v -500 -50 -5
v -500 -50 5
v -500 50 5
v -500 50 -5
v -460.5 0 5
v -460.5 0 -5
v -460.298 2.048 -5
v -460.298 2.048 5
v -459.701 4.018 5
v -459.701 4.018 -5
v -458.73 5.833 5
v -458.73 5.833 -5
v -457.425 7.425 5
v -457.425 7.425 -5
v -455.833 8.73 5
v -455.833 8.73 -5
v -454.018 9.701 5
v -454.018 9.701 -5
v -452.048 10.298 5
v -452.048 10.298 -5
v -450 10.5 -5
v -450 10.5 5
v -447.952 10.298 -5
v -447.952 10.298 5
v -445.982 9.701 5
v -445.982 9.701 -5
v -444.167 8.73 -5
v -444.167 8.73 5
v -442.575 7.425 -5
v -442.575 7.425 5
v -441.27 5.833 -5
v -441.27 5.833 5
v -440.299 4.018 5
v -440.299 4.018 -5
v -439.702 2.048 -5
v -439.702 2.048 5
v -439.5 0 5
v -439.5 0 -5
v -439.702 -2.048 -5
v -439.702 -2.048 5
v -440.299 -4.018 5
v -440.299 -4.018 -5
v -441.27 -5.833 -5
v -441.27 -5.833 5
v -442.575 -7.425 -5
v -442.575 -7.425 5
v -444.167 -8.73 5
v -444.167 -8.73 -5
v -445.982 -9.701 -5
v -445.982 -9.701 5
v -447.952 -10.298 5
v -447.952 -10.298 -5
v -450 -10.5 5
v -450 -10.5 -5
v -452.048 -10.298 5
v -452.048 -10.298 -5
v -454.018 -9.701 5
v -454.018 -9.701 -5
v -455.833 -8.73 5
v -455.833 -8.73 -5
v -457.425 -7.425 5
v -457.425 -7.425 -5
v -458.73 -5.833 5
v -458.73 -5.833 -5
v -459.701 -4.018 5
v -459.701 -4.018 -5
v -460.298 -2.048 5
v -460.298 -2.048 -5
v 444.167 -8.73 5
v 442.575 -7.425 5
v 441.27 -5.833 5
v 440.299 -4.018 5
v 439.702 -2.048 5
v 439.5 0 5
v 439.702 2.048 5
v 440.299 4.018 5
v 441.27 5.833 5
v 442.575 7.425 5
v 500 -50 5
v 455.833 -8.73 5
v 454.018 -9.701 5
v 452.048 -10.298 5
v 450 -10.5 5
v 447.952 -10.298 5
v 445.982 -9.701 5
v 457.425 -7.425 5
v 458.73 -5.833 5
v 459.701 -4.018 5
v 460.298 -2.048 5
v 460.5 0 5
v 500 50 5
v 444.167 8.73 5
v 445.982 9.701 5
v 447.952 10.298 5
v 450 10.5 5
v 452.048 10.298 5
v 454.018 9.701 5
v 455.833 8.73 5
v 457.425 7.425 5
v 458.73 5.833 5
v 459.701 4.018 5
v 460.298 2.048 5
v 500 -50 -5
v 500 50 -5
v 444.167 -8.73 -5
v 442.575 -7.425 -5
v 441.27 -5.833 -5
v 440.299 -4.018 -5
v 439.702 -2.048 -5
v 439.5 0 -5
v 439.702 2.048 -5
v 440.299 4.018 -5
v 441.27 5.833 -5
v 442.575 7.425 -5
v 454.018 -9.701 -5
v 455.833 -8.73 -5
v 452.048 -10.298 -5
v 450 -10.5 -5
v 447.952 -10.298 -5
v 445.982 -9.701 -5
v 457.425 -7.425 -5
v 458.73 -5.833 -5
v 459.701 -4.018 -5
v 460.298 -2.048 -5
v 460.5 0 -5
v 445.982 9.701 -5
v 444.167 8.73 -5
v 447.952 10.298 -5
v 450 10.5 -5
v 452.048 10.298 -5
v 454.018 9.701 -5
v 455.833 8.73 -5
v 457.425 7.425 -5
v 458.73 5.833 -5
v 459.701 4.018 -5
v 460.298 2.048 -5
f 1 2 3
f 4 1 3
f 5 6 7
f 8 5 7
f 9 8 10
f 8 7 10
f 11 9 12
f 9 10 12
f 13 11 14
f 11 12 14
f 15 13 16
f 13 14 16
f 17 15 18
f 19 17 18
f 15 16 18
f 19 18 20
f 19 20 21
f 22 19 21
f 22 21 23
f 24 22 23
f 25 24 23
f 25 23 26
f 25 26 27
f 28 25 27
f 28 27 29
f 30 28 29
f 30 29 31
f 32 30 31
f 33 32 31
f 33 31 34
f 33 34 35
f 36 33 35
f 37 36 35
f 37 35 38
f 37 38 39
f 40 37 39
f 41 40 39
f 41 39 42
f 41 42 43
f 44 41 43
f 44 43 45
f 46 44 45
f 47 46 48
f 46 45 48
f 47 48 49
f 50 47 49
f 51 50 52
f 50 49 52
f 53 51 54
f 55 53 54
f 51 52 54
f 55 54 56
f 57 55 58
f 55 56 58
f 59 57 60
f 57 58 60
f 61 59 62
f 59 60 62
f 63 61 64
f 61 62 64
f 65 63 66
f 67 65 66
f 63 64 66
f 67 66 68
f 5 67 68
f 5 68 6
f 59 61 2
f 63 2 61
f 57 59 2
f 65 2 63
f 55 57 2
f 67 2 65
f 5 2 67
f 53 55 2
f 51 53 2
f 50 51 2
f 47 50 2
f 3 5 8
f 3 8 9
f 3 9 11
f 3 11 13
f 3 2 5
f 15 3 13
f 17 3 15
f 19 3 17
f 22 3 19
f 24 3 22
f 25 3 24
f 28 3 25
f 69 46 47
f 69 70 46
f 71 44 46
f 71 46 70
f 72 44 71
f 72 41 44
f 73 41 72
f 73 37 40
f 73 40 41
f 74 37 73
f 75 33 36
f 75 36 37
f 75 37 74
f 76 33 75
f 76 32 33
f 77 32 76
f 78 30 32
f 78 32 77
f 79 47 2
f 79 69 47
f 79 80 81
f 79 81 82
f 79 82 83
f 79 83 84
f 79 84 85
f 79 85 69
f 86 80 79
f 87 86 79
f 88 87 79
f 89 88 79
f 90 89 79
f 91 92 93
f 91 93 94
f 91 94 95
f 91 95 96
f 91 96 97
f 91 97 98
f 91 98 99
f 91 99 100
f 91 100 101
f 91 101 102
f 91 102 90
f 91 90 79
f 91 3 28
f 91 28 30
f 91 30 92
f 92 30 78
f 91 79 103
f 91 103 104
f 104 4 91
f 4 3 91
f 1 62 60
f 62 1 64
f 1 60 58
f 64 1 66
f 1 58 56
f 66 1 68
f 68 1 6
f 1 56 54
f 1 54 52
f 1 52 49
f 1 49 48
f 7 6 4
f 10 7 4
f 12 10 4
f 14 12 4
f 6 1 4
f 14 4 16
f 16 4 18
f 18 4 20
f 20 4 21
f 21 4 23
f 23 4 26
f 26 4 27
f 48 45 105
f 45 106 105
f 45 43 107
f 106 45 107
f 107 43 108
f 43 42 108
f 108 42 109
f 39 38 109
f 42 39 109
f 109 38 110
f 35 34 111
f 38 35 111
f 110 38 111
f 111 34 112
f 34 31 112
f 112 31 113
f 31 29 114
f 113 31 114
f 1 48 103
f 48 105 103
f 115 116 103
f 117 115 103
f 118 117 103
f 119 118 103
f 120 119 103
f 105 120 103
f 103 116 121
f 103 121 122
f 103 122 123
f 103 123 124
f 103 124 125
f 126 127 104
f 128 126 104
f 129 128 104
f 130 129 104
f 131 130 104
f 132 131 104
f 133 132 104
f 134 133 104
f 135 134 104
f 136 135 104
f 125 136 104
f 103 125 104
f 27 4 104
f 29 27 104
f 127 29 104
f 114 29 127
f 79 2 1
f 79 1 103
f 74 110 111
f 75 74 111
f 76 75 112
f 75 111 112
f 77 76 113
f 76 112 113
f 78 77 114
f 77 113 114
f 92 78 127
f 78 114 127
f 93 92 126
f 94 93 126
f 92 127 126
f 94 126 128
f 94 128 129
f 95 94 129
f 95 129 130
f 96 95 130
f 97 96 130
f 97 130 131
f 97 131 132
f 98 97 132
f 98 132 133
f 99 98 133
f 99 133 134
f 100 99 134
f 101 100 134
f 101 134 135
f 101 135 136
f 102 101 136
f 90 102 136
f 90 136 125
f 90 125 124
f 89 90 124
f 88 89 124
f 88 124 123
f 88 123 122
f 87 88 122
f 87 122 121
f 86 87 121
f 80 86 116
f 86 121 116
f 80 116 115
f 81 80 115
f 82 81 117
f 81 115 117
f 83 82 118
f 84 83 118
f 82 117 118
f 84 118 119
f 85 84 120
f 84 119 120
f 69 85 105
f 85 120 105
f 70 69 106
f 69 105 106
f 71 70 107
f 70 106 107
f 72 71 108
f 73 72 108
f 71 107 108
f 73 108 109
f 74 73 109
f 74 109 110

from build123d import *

# Parameters (mm, degrees)
SKETCH_1_W          = 1000
SKETCH_1_H          = 100
EXTRUDE_1_DEPTH     = 5
HOLE_WIZARD_M24_1_D = 21


with BuildPart() as part:
    # 草图1 → 凸台-拉伸1 (new body, symmetric)
    with BuildSketch(Plane.XY):
        Rectangle(SKETCH_1_W, SKETCH_1_H)
    extrude(amount=EXTRUDE_1_DEPTH, both=True)

    # M24 螺纹孔1 (through all)
    with Locations(Plane.XY.offset(5)):
        with Locations((-450, 0), (450, 0)):
            Hole(HOLE_WIZARD_M24_1_D / 2)


solid = part.part
